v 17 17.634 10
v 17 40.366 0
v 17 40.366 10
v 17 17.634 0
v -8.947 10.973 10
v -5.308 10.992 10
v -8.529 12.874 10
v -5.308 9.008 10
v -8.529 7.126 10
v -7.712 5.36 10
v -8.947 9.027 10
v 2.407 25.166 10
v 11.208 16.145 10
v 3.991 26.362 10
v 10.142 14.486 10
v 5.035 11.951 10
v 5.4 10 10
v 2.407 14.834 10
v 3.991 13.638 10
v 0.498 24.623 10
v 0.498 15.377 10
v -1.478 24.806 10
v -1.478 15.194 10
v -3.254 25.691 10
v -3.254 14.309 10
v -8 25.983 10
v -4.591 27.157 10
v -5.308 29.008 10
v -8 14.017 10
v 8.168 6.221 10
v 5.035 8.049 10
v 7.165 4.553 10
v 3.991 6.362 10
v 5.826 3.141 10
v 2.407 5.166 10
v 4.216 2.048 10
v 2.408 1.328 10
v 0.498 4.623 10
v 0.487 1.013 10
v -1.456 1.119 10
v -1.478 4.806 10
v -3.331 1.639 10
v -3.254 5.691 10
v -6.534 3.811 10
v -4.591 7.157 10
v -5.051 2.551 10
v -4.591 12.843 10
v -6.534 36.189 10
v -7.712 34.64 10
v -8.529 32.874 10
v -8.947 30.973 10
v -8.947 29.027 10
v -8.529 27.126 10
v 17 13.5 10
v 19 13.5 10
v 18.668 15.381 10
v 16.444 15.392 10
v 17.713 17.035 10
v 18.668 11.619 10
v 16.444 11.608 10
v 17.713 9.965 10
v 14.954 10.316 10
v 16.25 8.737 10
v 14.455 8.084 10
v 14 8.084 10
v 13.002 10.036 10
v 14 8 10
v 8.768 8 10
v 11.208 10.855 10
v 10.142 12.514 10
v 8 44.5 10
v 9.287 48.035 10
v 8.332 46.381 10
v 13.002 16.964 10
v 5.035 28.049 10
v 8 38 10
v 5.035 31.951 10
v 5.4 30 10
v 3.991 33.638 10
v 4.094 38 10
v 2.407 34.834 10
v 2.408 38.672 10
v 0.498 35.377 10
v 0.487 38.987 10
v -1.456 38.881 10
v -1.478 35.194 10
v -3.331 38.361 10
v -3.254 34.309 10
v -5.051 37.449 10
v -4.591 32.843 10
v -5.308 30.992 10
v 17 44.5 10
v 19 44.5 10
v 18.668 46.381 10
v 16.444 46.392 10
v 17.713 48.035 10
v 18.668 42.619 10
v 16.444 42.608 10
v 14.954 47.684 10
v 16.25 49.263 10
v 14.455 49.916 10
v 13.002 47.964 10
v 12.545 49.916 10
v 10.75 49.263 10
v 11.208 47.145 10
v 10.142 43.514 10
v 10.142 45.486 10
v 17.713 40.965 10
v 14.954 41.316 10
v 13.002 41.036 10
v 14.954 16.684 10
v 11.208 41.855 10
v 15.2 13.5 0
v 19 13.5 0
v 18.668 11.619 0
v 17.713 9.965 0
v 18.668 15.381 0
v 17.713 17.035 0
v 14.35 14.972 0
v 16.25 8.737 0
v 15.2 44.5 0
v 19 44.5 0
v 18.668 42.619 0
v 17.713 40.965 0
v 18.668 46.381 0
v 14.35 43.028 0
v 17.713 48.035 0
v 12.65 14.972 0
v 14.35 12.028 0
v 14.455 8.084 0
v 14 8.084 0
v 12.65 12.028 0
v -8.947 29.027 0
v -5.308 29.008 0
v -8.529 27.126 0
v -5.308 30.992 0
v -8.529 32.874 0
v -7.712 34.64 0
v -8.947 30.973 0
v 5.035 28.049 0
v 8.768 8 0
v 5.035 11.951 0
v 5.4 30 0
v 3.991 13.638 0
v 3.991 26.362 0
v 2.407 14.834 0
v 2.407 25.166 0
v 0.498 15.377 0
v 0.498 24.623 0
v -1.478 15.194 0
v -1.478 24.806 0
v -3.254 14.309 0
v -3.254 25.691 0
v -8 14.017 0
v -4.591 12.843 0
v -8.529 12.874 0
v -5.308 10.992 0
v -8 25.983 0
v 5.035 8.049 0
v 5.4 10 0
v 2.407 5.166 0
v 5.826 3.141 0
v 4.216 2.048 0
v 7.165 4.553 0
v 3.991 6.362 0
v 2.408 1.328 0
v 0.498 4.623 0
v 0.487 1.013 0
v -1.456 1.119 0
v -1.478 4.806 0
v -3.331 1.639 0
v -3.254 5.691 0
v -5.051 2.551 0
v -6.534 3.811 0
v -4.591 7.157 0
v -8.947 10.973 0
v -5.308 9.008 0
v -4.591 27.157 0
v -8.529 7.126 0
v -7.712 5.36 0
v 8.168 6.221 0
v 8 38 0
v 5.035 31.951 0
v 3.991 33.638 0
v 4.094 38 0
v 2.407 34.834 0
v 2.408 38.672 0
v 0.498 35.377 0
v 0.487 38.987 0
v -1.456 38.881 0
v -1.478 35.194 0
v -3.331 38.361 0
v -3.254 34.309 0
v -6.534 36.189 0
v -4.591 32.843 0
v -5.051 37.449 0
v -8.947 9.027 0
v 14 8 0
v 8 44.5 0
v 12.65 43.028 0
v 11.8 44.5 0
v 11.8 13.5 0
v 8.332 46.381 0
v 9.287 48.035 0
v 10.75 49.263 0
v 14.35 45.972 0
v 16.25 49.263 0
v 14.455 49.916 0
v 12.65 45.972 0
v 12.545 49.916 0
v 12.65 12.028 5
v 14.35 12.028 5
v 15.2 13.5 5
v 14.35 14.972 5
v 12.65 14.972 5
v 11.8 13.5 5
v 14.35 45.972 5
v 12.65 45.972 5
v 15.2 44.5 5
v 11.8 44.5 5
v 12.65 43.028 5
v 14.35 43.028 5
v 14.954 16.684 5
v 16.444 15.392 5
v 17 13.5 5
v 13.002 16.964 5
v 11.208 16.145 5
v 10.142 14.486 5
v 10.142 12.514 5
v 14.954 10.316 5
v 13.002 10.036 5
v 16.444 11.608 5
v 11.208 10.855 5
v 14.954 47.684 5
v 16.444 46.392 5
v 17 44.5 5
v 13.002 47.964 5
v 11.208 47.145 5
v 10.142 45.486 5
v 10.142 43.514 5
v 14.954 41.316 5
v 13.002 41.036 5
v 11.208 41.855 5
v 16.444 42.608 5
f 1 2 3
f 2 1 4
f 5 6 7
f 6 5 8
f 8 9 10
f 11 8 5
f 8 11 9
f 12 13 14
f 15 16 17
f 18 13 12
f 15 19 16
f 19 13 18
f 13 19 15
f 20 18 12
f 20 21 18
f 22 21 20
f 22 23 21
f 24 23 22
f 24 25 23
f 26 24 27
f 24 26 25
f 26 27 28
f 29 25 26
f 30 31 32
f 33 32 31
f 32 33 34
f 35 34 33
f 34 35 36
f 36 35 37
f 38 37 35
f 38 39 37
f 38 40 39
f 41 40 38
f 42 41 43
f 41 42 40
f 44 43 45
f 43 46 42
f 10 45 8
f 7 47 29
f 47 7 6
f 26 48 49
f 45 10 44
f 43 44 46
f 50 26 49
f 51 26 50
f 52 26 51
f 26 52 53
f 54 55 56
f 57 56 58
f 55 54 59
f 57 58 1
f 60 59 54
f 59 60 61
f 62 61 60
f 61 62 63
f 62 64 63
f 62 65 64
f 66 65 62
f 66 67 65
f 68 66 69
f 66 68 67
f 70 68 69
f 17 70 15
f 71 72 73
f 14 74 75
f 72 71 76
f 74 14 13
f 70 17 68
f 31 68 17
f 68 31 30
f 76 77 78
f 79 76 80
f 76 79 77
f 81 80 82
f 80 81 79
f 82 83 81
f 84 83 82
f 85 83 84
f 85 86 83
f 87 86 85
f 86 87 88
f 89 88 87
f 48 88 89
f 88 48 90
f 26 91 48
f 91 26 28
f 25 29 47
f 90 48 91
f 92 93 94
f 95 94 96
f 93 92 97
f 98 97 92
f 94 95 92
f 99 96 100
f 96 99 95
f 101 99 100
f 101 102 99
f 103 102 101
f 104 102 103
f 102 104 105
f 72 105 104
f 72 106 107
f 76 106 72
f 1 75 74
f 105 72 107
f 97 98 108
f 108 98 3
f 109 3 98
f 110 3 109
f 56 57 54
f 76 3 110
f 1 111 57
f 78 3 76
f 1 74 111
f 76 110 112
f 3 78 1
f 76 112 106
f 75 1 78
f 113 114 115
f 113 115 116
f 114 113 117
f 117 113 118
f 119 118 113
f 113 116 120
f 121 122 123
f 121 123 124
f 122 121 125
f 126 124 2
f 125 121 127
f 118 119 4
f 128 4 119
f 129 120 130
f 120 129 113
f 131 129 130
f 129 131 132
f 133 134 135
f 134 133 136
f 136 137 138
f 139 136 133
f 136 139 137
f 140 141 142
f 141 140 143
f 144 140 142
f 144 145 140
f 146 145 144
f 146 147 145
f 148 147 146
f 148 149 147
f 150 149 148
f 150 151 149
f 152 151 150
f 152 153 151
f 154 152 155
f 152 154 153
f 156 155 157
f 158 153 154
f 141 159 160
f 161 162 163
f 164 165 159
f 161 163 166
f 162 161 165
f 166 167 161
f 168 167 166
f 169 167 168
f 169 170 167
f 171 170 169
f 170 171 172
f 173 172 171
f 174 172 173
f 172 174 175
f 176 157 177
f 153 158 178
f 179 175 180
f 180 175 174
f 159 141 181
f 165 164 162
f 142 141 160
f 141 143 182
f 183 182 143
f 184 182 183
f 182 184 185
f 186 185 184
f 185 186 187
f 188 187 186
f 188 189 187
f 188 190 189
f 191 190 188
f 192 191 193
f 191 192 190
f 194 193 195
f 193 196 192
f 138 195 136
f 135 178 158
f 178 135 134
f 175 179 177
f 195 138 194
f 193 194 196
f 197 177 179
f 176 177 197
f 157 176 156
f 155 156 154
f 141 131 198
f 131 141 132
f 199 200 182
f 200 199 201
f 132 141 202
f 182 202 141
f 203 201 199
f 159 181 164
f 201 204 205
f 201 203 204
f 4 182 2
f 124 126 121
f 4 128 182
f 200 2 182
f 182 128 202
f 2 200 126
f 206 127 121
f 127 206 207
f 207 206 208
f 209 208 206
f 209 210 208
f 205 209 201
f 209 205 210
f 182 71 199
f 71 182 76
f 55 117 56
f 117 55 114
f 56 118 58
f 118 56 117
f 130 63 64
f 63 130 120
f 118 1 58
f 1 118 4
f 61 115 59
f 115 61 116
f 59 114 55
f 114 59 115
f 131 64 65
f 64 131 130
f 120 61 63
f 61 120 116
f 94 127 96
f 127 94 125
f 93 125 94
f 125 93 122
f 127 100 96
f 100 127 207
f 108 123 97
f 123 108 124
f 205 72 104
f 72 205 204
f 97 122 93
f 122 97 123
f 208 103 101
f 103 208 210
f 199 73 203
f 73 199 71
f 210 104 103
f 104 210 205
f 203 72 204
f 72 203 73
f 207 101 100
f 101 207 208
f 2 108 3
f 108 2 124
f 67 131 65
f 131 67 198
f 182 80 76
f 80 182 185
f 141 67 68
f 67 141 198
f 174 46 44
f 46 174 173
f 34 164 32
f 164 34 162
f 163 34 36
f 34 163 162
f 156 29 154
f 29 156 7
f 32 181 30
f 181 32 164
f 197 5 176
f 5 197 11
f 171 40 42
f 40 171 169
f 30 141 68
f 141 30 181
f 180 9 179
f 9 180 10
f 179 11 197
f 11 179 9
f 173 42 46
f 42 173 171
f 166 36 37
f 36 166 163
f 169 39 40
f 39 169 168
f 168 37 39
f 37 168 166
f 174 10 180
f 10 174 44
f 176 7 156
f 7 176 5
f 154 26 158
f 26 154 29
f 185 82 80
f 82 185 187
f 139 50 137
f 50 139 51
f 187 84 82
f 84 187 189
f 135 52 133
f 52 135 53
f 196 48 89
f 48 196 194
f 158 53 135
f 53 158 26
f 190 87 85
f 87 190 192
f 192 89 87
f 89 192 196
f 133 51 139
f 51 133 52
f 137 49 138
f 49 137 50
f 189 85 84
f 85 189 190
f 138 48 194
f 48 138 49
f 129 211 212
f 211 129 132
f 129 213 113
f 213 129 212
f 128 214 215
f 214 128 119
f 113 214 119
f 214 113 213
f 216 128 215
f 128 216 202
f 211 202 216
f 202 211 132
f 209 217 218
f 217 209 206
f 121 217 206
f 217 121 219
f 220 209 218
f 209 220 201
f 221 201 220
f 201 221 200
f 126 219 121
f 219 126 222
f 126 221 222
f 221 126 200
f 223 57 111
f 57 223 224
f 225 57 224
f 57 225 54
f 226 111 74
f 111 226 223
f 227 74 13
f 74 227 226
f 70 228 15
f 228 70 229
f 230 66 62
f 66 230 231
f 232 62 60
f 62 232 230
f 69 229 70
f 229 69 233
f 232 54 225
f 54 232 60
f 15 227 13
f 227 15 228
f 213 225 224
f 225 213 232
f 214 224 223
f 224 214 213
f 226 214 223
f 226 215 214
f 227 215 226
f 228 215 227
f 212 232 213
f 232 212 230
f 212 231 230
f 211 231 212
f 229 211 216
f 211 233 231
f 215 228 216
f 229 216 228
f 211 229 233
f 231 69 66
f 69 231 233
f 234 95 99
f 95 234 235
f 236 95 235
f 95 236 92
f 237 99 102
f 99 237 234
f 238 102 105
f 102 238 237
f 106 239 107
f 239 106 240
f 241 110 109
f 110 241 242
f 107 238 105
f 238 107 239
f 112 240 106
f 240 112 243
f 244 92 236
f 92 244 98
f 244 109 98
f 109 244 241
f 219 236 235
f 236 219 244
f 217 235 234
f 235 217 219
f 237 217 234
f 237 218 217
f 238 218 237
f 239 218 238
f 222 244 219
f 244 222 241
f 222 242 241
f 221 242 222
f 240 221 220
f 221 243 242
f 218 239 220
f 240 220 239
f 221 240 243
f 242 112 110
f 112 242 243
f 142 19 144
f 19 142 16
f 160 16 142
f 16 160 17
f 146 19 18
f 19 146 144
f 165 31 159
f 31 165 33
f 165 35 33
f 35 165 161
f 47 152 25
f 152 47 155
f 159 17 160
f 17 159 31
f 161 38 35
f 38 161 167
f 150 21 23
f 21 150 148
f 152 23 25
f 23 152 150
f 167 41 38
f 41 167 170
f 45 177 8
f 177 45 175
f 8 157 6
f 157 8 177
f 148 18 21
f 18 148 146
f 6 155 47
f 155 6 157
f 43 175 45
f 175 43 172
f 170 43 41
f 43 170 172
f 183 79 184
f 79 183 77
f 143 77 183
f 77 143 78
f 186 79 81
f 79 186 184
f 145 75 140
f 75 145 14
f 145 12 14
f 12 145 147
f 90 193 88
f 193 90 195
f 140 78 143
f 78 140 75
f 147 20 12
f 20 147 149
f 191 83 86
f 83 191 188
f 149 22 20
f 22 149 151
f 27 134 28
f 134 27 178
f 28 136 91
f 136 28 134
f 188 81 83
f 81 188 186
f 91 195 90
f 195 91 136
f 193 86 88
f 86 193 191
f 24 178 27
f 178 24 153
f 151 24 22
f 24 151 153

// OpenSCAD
// PRUSA iteration3
// Y motor mount
// GNU GPL v3
// Josef Průša <iam@josefprusa.cz> and contributors
// http://www.reprap.org/wiki/Prusa_Mendel
// http://prusamendel.org

//include <configuration.scad>

module y_motor_base(){
 // Motor holding part
 translate(v = [29,-21+50,0]){
  translate(v = [-21+4.5,0,5]) cube(size = [9,31,10], center=true);
  translate(v = [-15.5,-15.5,0]) cylinder(h = 10, r=5.5);
  translate(v = [-15.5,+15.5,0]) cylinder(h = 10, r=5.5);
  // Joins motor holder and rod plate
  translate(v = [-29,-21,0]) cube(size = [14,30,10]);
 }
 // Front holding part
 translate(v = [0,10,0]) cylinder(h = 10, r=9);
 translate(v = [0,20,5])cube(size = [16,20,10], center=true);	
 translate(v = [0,30,0])cylinder(h = 10, r=9);
}

module y_motor_holes(){
 translate(v = [29,-21+50,0]){
  // Screw head holes
  translate(v = [-15.5,-15.5,-1]) cylinder(h = 10, r=1.7);
  translate(v = [-15.5,+15.5,-1]) cylinder(h = 10, r=1.7);
  // Screw holes
  translate(v = [-15.5,-15.5,5]) cylinder(h = 7, r=3.5);
  translate(v = [-15.5,+15.5,5]) cylinder(h = 7, r=3.5);
 }
 translate(v = [0,10,-1]) cylinder(h = 12, r=5.4);	
 translate(v = [0,30,-1])cylinder(h = 12, r=5.4);
}

// Final part
module y_motor(){
 difference(){
  y_motor_base();
  y_motor_holes();
 }
}

y_motor();
